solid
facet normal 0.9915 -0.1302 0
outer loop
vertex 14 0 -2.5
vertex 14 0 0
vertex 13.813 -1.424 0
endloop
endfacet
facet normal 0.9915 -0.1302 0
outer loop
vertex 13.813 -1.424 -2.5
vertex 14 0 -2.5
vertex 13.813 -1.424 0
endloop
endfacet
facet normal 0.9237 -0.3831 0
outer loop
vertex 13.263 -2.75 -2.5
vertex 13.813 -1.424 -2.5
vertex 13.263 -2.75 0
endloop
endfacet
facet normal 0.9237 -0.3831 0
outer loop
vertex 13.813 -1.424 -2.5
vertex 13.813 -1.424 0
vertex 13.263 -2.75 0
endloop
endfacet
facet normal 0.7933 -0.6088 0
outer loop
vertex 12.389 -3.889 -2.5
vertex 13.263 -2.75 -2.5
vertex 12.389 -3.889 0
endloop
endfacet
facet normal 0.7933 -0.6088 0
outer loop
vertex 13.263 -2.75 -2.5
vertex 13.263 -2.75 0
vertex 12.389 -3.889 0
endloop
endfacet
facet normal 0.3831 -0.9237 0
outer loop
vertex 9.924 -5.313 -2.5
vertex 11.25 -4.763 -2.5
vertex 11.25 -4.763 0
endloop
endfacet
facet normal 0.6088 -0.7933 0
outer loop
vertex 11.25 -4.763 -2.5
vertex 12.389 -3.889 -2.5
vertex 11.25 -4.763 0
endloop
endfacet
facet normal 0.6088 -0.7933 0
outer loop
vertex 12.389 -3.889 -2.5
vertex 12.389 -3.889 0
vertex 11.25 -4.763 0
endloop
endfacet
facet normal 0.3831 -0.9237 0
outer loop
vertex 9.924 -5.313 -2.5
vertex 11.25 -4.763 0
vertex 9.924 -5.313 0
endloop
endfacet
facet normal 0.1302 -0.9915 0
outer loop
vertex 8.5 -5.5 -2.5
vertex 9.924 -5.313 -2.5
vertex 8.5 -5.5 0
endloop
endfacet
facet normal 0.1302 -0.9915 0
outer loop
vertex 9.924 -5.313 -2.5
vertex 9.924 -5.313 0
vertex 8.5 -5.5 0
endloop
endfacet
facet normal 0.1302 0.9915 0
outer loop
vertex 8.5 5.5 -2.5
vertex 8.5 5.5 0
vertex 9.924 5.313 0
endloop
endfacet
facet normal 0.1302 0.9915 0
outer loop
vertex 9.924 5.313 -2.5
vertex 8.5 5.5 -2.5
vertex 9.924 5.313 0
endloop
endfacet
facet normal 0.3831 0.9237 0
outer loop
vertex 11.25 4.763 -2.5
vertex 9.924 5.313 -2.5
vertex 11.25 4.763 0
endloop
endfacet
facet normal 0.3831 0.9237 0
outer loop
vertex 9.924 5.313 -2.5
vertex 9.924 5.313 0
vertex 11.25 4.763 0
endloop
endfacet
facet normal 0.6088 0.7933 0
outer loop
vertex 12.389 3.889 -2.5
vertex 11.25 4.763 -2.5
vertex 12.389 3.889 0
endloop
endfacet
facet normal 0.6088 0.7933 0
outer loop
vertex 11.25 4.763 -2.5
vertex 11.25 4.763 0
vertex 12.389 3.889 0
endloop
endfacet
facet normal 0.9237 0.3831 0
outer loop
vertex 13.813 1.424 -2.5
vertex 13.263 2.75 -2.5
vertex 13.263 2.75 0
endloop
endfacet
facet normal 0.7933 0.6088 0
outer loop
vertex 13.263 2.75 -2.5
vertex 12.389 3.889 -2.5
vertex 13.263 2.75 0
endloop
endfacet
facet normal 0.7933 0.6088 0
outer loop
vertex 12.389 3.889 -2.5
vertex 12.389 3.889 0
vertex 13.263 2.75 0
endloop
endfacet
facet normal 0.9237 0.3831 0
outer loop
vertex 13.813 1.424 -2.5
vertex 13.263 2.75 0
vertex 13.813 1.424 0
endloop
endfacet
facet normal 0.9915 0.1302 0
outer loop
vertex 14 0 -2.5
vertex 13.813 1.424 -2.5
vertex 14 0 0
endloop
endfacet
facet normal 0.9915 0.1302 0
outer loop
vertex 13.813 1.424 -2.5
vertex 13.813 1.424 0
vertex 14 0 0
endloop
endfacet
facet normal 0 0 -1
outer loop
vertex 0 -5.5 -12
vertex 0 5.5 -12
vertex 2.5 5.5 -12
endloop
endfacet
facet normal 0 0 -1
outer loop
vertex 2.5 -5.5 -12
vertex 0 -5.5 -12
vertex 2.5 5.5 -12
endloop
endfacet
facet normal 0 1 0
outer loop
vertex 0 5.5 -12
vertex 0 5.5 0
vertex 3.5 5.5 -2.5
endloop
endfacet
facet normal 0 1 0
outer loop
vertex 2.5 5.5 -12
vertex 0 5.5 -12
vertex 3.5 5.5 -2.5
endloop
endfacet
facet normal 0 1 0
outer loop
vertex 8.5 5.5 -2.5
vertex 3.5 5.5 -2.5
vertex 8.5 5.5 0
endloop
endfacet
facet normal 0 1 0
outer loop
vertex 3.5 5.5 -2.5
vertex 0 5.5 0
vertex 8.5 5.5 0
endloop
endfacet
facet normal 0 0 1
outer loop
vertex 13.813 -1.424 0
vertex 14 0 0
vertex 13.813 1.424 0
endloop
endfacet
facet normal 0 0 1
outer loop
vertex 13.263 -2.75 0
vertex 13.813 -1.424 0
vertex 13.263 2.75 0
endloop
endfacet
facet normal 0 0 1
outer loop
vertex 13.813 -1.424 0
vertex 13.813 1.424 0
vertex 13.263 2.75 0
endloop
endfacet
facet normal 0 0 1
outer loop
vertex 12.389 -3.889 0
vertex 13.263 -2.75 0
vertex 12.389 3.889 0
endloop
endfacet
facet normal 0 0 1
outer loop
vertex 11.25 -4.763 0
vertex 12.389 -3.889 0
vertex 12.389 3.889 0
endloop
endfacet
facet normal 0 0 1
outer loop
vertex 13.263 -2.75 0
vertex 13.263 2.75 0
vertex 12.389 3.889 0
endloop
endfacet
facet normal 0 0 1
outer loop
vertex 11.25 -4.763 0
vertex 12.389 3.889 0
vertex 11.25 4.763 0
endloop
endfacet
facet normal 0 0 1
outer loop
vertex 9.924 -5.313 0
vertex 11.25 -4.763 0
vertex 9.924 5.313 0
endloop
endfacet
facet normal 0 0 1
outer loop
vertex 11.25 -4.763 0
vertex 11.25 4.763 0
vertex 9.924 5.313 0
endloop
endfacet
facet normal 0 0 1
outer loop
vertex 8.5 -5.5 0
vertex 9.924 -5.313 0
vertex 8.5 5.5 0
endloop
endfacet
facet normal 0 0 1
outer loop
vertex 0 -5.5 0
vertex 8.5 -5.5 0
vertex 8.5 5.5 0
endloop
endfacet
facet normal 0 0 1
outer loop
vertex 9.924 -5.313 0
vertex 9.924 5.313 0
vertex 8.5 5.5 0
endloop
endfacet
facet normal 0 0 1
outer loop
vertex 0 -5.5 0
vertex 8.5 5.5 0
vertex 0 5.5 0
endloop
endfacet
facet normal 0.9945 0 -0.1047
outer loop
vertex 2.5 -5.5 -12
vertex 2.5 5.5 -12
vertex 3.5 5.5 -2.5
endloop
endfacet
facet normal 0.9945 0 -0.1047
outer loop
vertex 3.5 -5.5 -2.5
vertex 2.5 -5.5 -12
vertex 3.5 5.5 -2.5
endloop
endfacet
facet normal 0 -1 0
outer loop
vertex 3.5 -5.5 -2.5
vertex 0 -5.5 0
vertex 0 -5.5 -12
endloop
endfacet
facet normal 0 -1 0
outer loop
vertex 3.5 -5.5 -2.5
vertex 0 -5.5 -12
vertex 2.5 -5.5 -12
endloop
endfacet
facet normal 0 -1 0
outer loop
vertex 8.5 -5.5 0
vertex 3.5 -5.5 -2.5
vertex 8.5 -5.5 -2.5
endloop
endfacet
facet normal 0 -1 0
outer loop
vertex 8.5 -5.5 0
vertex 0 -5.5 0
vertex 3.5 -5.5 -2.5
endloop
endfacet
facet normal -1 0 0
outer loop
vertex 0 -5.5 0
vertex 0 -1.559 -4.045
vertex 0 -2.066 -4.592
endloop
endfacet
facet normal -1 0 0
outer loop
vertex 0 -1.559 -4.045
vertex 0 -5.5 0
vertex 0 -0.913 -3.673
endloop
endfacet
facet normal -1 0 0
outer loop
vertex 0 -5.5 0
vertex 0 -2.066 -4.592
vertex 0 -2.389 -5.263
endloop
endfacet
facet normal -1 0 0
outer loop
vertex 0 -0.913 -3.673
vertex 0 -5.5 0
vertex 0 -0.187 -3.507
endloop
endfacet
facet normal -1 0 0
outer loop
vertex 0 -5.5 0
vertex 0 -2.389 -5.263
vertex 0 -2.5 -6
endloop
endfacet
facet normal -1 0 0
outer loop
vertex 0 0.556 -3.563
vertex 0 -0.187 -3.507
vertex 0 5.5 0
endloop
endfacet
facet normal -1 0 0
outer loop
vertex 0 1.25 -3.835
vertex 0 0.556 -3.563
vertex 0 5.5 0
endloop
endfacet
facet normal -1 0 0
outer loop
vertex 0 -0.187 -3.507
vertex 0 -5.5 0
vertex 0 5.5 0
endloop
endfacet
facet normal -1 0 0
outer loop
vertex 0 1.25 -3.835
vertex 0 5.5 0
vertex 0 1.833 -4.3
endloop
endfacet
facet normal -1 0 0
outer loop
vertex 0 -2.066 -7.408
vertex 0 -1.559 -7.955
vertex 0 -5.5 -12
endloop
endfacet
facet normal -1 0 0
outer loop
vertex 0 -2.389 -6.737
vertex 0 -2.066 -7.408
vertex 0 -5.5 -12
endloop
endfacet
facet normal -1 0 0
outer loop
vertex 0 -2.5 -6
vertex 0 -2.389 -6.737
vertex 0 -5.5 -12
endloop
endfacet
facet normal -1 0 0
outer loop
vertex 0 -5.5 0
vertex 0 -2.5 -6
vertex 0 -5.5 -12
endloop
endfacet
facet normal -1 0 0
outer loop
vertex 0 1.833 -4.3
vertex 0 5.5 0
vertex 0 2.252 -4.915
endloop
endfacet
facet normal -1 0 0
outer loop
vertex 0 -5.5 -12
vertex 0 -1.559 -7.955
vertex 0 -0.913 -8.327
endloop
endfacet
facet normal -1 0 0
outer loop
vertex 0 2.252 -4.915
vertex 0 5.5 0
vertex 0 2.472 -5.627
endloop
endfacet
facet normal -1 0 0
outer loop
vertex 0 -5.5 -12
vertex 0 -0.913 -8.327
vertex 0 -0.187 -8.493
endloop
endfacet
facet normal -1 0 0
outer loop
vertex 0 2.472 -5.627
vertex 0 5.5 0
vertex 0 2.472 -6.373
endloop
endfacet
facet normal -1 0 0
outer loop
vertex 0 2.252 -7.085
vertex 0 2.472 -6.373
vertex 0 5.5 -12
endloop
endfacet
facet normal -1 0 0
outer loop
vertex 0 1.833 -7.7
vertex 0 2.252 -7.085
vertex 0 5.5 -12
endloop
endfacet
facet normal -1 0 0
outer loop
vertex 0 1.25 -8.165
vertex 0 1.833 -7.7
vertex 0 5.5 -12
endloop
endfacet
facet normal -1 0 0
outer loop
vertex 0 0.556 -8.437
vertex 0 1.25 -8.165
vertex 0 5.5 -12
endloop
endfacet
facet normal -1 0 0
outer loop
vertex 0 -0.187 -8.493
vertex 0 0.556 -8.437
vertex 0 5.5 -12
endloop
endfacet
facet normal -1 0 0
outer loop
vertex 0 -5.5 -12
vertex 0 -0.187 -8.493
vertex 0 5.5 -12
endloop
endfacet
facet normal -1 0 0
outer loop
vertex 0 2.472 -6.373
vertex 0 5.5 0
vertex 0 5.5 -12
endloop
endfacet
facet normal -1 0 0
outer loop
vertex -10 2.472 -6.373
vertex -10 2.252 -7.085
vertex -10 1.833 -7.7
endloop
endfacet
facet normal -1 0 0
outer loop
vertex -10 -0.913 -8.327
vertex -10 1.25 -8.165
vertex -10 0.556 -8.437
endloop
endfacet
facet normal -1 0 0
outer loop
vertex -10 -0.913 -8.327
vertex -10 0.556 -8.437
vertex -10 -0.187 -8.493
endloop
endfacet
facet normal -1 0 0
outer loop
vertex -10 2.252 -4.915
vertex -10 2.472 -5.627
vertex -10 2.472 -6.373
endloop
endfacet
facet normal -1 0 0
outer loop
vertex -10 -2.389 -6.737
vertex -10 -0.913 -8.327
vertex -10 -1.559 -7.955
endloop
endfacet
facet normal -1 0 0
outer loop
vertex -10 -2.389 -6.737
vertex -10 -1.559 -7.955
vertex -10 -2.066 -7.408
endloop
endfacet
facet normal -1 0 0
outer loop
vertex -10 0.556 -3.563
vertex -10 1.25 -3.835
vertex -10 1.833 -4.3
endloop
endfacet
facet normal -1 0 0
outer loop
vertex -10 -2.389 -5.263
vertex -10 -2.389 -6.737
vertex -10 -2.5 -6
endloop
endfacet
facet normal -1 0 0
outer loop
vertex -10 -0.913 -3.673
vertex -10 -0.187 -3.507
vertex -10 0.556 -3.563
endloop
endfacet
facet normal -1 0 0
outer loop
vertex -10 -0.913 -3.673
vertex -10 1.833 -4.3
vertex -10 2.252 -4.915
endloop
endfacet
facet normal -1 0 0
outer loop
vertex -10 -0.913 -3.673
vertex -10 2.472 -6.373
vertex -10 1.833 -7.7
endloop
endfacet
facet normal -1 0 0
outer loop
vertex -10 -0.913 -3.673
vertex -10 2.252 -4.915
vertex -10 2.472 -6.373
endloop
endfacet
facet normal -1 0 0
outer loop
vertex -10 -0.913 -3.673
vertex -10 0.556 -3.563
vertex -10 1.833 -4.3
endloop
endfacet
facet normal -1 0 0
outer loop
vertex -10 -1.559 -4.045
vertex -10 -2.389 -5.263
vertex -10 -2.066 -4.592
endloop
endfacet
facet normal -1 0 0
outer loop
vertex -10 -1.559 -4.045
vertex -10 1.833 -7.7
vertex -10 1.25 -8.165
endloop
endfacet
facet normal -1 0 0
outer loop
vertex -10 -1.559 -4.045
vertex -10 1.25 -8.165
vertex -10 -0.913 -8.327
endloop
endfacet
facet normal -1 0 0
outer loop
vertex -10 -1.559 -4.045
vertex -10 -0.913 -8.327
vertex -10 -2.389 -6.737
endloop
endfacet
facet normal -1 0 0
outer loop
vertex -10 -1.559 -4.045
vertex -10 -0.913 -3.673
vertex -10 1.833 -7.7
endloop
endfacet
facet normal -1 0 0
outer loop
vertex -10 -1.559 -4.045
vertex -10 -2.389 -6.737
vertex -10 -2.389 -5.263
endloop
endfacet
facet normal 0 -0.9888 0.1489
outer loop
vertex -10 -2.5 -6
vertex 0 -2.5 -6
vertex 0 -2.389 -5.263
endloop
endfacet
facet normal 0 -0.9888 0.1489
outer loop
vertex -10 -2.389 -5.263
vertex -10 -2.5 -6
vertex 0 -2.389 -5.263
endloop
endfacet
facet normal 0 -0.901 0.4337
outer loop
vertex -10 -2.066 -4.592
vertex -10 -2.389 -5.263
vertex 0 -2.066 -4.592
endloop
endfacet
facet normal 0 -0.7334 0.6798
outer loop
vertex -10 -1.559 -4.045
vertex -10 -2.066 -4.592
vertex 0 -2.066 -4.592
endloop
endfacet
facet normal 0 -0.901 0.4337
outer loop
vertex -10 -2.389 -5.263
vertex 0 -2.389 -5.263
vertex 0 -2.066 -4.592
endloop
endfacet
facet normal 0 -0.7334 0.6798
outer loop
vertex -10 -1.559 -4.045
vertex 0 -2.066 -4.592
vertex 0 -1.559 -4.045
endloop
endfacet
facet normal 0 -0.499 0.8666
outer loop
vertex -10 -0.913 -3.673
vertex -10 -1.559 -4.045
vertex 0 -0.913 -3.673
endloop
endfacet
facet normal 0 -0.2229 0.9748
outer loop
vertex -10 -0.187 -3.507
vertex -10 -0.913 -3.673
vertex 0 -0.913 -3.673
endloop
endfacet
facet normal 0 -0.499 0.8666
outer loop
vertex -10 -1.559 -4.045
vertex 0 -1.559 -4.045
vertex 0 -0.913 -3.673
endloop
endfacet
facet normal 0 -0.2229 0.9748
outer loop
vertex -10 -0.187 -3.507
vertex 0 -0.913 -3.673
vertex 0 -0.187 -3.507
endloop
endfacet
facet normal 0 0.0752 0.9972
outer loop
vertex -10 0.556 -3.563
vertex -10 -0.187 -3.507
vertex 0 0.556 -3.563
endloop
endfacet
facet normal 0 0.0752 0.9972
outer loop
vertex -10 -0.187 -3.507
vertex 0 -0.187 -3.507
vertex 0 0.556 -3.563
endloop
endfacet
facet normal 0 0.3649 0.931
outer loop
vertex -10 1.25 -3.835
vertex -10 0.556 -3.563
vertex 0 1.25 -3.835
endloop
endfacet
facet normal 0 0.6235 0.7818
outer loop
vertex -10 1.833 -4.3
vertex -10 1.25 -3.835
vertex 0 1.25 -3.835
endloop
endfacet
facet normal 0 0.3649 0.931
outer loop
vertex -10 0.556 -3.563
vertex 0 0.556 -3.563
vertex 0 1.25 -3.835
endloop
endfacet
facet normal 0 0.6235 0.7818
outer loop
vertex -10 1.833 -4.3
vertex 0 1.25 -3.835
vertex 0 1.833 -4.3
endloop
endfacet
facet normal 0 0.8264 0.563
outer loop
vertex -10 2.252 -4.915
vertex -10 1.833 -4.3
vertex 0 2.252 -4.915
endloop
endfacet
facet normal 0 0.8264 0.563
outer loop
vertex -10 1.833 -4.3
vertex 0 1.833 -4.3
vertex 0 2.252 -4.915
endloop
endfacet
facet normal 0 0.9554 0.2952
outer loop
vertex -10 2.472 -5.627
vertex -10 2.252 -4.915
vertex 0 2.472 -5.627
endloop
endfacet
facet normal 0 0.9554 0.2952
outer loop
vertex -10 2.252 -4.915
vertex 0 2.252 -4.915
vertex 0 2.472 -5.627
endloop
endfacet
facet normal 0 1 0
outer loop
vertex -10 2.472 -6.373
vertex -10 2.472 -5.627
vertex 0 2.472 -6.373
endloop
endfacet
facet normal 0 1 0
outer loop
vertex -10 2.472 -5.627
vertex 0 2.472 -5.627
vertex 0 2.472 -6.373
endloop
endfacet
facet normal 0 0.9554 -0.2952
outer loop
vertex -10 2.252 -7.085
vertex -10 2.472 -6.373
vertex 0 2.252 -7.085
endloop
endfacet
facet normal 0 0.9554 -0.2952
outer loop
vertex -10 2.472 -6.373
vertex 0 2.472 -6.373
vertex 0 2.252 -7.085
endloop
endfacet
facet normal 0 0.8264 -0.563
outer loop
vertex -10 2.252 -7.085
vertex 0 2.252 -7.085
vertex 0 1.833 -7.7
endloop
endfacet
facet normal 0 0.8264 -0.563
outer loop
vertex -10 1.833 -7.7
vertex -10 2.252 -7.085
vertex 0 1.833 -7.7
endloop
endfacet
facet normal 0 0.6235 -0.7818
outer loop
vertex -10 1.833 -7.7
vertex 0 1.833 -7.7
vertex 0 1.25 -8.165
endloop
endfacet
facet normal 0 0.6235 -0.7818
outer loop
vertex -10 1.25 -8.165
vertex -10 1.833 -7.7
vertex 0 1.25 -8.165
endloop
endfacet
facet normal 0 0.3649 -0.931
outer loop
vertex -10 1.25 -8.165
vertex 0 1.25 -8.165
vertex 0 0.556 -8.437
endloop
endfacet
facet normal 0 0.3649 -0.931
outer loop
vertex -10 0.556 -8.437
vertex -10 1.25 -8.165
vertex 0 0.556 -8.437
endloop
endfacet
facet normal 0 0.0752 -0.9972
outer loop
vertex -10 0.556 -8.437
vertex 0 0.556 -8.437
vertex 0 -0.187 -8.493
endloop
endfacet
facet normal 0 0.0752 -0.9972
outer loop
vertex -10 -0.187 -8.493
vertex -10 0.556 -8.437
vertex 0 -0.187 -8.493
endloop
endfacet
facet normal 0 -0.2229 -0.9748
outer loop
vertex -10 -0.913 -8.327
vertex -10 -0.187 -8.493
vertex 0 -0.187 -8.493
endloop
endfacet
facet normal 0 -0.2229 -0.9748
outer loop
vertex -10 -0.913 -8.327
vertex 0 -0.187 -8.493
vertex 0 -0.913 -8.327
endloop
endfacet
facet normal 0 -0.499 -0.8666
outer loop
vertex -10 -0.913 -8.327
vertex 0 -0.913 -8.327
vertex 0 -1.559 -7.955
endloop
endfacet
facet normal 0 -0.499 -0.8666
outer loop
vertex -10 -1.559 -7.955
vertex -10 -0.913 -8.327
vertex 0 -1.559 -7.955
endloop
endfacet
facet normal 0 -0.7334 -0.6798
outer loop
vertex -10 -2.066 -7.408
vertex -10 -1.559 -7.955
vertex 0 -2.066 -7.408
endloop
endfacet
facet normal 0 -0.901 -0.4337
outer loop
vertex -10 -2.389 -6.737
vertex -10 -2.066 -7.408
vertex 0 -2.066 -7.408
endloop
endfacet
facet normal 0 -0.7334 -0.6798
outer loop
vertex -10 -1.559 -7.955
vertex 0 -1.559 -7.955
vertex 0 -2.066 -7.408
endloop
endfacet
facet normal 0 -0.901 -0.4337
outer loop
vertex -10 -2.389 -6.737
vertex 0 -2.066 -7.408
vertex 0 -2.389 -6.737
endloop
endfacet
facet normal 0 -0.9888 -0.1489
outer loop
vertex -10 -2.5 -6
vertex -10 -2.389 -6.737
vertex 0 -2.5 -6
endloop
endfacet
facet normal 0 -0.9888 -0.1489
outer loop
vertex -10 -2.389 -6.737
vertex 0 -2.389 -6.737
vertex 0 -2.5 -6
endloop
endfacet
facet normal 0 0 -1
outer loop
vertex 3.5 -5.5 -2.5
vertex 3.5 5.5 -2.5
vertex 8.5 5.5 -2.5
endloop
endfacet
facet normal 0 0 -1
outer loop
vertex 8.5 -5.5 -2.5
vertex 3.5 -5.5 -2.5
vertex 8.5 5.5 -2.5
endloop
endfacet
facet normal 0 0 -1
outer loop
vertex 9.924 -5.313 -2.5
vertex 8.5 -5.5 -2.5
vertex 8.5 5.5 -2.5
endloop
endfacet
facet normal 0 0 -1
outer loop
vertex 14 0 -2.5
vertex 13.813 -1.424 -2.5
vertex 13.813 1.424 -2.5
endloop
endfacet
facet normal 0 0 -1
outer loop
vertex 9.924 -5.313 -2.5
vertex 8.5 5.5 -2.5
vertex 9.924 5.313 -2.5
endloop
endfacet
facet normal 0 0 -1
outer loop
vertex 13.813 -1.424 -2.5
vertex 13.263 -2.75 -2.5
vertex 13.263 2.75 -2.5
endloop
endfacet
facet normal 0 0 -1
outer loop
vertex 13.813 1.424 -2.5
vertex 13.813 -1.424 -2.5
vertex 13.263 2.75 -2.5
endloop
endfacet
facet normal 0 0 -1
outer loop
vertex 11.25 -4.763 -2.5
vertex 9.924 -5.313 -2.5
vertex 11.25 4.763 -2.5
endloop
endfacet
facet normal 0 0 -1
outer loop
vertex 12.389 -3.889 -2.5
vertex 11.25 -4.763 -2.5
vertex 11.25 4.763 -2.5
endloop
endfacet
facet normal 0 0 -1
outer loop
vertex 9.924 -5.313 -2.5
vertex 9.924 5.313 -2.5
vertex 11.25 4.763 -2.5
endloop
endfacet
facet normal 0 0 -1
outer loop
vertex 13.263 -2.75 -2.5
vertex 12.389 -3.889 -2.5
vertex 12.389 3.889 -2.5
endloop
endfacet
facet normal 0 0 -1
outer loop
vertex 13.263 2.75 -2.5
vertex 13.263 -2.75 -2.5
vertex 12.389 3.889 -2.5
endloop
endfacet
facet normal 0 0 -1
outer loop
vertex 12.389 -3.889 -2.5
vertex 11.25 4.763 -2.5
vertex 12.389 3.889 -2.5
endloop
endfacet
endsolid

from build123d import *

# Parameters (mm, degrees)
F1_DEPTH = 11
F4_DEPTH = 12.001
F5_R     = 2.5
F6_DEPTH = 10


with BuildPart() as f1:
    # F0 (on Front) → F1 (new body)
    with BuildSketch(Plane.XZ):
        Polygon((14, 0), (0, 0), (0, -12), (2.5, -12), (3.5, -2.5), (14, -2.5), align=None)
    extrude(amount=F1_DEPTH)


with BuildPart() as f1_1:
    # F2: moved
    add(f1.part.moved(Location((0, 5.5, 0))))

    # F3 (on face) → F4 (cut, through all)
    with BuildSketch(Plane.XY):
        with BuildLine():
            ThreePointArc((8.5, 5.5), (12.3890872965, 3.8890872965), (14, 0))
            Line((14, 0), (14, 5.5))
            Line((14, 5.5), (8.5, 5.5))
        make_face()
        with BuildLine():
            ThreePointArc((14, 0), (12.3890872965, -3.8890872965), (8.5, -5.5))
            Line((8.5, -5.5), (14, -5.5))
            Line((14, -5.5), (14, 0))
        make_face()
    extrude(amount=-F4_DEPTH, mode=Mode.SUBTRACT)

    # F5 (on face) → F6 (join)
    with BuildSketch(Plane(origin=(0, 0, 0), x_dir=(0, -1, 0), z_dir=(-1, 0, 0))):
        with Locations((0, -6)):
            Circle(F5_R)
    extrude(amount=F6_DEPTH)


solid = f1_1.part
